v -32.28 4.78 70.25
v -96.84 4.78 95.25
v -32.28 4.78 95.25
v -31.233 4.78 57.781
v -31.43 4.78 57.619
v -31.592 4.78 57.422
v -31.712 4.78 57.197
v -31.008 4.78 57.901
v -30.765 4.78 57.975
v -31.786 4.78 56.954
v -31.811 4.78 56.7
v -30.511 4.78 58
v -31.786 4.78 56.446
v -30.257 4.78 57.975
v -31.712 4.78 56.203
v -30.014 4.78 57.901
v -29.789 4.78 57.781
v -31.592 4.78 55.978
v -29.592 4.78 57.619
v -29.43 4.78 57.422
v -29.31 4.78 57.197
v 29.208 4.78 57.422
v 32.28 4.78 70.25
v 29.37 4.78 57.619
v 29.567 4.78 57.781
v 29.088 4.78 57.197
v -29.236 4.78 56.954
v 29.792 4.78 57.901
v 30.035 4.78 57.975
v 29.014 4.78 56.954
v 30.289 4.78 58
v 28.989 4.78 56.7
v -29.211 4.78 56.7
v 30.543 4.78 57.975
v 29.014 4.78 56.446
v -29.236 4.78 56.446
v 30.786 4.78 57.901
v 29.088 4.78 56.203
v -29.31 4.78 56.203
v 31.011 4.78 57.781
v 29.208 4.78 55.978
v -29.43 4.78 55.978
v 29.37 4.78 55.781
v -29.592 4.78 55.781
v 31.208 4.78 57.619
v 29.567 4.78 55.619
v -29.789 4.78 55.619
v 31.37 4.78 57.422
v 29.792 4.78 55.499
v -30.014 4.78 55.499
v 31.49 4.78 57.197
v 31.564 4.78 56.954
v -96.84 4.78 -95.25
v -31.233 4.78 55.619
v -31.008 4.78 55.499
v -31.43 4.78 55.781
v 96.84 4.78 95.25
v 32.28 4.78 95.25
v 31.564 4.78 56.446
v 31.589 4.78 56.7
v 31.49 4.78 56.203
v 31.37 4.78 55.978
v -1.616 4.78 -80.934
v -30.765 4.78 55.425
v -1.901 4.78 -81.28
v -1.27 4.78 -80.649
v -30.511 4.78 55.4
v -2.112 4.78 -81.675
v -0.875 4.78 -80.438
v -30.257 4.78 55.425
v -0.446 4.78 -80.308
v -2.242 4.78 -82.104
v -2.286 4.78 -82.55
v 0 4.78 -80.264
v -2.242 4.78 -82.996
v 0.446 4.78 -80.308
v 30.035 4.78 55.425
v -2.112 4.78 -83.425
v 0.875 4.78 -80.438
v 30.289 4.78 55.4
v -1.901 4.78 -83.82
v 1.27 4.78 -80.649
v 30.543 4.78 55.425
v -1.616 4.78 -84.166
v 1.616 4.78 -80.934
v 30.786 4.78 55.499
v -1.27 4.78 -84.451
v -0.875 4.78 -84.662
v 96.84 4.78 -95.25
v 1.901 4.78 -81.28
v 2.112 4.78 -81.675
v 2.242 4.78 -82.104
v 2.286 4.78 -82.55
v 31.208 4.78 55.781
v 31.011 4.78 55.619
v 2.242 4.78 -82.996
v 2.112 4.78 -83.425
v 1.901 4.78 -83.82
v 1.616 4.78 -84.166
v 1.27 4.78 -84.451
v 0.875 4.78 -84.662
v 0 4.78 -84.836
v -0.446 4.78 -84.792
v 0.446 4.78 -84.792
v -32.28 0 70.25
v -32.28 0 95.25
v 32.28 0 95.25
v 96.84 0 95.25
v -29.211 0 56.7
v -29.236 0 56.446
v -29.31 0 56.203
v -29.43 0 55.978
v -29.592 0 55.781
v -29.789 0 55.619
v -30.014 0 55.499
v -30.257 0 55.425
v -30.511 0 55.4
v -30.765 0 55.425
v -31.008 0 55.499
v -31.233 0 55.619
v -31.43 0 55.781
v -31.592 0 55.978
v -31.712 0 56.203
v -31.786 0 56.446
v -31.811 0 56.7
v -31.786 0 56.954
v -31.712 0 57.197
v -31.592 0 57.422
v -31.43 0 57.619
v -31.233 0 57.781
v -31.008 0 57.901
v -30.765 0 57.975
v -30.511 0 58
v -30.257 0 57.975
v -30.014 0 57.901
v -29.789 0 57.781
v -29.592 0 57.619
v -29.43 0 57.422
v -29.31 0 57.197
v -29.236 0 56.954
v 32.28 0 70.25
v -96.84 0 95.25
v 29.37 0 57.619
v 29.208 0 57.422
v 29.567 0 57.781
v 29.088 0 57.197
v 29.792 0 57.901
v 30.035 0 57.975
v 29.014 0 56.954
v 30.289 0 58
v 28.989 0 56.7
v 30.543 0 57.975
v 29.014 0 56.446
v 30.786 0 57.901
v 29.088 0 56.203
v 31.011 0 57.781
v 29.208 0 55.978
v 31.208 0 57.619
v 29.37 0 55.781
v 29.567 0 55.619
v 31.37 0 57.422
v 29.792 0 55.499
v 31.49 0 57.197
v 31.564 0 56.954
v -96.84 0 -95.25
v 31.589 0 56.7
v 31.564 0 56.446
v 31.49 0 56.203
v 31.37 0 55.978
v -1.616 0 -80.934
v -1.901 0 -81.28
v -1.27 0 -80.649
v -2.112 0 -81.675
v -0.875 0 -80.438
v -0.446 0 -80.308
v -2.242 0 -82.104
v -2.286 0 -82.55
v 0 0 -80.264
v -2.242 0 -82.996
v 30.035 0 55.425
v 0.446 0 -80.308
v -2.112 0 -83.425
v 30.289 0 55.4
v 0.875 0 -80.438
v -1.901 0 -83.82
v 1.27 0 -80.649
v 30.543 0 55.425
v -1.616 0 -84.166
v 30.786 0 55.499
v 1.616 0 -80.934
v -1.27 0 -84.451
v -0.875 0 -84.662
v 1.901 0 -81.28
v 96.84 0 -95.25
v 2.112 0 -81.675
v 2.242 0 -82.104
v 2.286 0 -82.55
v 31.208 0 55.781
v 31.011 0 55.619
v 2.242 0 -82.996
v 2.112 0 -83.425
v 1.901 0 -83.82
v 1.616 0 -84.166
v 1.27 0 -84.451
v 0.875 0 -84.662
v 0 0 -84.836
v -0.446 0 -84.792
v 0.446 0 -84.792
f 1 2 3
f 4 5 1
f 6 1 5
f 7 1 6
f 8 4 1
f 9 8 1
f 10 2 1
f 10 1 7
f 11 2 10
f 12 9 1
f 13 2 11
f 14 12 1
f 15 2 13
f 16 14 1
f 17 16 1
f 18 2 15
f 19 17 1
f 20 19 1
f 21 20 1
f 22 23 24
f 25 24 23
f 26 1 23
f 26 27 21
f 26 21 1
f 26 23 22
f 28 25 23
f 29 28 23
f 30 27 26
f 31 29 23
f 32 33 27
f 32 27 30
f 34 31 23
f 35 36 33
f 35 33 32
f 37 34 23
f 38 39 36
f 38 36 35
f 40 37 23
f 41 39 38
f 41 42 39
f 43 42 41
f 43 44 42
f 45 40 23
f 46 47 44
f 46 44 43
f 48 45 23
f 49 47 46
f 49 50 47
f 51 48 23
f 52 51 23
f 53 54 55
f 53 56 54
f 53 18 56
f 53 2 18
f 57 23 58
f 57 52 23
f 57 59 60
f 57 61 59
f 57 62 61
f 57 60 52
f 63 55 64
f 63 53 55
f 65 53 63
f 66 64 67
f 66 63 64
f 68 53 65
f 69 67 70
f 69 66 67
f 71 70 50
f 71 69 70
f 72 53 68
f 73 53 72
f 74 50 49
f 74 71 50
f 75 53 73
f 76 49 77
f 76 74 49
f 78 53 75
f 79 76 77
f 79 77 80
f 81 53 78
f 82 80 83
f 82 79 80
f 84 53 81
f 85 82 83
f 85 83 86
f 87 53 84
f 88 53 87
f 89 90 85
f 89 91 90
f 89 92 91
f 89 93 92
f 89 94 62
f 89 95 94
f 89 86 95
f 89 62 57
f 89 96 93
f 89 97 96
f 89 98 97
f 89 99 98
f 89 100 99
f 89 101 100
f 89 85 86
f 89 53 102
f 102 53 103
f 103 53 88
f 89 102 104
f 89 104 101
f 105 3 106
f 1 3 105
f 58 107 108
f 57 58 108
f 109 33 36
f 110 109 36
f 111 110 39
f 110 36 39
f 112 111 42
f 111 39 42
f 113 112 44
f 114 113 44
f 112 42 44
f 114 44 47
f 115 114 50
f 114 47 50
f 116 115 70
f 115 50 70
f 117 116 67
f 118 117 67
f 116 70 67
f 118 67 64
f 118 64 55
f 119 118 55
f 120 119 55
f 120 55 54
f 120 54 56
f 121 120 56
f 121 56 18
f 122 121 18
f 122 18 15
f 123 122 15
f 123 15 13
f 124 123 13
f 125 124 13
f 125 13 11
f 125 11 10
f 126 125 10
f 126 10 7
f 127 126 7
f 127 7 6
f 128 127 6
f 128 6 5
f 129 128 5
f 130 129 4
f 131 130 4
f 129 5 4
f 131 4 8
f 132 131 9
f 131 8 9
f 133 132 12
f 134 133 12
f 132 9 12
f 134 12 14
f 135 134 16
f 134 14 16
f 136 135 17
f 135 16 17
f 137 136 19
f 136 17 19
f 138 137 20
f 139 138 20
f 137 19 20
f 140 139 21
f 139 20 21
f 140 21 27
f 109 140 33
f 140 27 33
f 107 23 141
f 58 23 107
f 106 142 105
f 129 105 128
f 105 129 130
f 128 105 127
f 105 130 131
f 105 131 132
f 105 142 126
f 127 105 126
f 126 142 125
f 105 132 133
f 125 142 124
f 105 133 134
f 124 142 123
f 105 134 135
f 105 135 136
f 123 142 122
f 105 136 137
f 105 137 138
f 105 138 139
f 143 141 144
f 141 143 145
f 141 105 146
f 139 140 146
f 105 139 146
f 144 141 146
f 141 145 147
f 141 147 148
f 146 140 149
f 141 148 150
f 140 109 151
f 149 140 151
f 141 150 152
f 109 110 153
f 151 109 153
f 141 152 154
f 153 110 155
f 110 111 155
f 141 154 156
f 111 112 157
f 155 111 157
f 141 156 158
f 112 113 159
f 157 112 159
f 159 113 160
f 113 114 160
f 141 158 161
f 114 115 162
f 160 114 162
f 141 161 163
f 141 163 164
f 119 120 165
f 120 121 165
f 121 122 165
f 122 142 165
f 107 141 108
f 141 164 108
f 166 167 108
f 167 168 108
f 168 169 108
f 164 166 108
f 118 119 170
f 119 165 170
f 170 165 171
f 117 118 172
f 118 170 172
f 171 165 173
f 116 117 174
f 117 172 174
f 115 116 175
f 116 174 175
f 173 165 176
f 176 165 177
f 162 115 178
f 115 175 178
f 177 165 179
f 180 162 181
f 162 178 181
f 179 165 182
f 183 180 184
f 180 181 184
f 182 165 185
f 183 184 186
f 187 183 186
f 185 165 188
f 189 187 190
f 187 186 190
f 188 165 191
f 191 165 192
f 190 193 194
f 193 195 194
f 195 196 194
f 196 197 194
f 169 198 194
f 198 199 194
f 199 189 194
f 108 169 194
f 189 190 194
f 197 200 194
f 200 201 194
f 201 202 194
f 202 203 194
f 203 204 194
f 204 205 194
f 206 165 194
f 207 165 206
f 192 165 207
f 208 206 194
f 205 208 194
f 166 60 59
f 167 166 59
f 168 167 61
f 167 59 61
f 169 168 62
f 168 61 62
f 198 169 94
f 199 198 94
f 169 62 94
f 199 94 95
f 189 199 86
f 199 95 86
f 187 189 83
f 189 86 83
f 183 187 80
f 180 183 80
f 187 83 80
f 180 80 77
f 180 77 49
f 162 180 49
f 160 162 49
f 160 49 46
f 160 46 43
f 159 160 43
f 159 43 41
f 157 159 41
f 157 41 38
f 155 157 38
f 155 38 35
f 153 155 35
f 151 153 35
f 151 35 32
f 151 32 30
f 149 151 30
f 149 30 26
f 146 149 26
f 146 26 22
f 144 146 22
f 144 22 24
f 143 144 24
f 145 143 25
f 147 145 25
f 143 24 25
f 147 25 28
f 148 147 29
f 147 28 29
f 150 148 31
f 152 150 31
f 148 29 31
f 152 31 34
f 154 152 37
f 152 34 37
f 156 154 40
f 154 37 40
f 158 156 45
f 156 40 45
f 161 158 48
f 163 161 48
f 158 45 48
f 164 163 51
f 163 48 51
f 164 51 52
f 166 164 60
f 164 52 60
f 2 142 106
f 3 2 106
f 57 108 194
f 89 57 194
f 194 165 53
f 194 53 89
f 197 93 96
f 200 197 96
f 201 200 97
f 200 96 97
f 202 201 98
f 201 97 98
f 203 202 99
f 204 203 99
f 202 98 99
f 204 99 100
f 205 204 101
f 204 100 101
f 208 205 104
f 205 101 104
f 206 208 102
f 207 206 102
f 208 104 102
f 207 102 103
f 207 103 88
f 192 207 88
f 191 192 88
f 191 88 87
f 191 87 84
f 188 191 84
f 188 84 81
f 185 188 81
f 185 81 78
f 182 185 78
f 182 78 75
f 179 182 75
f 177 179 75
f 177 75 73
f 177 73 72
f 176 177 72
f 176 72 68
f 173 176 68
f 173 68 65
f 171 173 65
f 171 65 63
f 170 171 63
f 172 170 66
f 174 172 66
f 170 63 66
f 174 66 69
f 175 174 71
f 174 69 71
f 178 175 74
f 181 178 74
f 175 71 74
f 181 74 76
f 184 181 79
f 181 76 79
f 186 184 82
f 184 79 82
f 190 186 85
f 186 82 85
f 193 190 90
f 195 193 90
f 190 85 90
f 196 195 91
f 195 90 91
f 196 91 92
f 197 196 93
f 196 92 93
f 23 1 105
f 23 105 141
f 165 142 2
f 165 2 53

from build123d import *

# Parameters (mm, degrees)
SKETCH1_W           = 193.68
SKETCH1_H           = 190.5
BOSS_EXTRUDE1_DEPTH = 4.78
SKETCH2_R           = 2.286
CUT_EXTRUDE1_DEPTH  = 5.78
CUT_EXTRUDE2_DEPTH  = 5.78
SKETCH4_R           = 1.3
CUT_EXTRUDE4_DEPTH  = 5.78


with BuildPart() as part:
    # Sketch1 → Boss-Extrude1 (new body)
    with BuildSketch(Plane(origin=(0, 0, 0), x_dir=(1, 0, 0), z_dir=(0, 1, 0))):
        Rectangle(SKETCH1_W, SKETCH1_H)
    extrude(amount=BOSS_EXTRUDE1_DEPTH)

    # Sketch2 → Cut-Extrude1 (cut, through all)
    with BuildSketch(Plane(origin=(0, 4.78, 0), x_dir=(1, 0, 0), z_dir=(0, 1, 0))):
        with Locations((0, 82.55)):
            Circle(SKETCH2_R)
    extrude(amount=-CUT_EXTRUDE1_DEPTH, mode=Mode.SUBTRACT)

    # Sketch3 → Cut-Extrude2 (cut, through all)
    with BuildSketch(Plane(origin=(0, 4.78, 0), x_dir=(1, 0, 0), z_dir=(0, 1, 0))):
        Polygon((0, -95.25), (-32.28, -95.25), (-32.28, -70.249999962), (32.28, -70.249999962), (32.28, -95.25), align=None)
    extrude(amount=-CUT_EXTRUDE2_DEPTH, mode=Mode.SUBTRACT)

    # Sketch4 → Cut-Extrude4 (cut, through all)
    with BuildSketch(Plane(origin=(0, 4.78, 0), x_dir=(1, 0, 0), z_dir=(0, 1, 0))):
        with Locations((-30.511, -56.699999962)):
            Circle(SKETCH4_R)
        with Locations((30.289, -56.699999962)):
            Circle(SKETCH4_R)
    extrude(amount=-CUT_EXTRUDE4_DEPTH, mode=Mode.SUBTRACT)


solid = part.part
